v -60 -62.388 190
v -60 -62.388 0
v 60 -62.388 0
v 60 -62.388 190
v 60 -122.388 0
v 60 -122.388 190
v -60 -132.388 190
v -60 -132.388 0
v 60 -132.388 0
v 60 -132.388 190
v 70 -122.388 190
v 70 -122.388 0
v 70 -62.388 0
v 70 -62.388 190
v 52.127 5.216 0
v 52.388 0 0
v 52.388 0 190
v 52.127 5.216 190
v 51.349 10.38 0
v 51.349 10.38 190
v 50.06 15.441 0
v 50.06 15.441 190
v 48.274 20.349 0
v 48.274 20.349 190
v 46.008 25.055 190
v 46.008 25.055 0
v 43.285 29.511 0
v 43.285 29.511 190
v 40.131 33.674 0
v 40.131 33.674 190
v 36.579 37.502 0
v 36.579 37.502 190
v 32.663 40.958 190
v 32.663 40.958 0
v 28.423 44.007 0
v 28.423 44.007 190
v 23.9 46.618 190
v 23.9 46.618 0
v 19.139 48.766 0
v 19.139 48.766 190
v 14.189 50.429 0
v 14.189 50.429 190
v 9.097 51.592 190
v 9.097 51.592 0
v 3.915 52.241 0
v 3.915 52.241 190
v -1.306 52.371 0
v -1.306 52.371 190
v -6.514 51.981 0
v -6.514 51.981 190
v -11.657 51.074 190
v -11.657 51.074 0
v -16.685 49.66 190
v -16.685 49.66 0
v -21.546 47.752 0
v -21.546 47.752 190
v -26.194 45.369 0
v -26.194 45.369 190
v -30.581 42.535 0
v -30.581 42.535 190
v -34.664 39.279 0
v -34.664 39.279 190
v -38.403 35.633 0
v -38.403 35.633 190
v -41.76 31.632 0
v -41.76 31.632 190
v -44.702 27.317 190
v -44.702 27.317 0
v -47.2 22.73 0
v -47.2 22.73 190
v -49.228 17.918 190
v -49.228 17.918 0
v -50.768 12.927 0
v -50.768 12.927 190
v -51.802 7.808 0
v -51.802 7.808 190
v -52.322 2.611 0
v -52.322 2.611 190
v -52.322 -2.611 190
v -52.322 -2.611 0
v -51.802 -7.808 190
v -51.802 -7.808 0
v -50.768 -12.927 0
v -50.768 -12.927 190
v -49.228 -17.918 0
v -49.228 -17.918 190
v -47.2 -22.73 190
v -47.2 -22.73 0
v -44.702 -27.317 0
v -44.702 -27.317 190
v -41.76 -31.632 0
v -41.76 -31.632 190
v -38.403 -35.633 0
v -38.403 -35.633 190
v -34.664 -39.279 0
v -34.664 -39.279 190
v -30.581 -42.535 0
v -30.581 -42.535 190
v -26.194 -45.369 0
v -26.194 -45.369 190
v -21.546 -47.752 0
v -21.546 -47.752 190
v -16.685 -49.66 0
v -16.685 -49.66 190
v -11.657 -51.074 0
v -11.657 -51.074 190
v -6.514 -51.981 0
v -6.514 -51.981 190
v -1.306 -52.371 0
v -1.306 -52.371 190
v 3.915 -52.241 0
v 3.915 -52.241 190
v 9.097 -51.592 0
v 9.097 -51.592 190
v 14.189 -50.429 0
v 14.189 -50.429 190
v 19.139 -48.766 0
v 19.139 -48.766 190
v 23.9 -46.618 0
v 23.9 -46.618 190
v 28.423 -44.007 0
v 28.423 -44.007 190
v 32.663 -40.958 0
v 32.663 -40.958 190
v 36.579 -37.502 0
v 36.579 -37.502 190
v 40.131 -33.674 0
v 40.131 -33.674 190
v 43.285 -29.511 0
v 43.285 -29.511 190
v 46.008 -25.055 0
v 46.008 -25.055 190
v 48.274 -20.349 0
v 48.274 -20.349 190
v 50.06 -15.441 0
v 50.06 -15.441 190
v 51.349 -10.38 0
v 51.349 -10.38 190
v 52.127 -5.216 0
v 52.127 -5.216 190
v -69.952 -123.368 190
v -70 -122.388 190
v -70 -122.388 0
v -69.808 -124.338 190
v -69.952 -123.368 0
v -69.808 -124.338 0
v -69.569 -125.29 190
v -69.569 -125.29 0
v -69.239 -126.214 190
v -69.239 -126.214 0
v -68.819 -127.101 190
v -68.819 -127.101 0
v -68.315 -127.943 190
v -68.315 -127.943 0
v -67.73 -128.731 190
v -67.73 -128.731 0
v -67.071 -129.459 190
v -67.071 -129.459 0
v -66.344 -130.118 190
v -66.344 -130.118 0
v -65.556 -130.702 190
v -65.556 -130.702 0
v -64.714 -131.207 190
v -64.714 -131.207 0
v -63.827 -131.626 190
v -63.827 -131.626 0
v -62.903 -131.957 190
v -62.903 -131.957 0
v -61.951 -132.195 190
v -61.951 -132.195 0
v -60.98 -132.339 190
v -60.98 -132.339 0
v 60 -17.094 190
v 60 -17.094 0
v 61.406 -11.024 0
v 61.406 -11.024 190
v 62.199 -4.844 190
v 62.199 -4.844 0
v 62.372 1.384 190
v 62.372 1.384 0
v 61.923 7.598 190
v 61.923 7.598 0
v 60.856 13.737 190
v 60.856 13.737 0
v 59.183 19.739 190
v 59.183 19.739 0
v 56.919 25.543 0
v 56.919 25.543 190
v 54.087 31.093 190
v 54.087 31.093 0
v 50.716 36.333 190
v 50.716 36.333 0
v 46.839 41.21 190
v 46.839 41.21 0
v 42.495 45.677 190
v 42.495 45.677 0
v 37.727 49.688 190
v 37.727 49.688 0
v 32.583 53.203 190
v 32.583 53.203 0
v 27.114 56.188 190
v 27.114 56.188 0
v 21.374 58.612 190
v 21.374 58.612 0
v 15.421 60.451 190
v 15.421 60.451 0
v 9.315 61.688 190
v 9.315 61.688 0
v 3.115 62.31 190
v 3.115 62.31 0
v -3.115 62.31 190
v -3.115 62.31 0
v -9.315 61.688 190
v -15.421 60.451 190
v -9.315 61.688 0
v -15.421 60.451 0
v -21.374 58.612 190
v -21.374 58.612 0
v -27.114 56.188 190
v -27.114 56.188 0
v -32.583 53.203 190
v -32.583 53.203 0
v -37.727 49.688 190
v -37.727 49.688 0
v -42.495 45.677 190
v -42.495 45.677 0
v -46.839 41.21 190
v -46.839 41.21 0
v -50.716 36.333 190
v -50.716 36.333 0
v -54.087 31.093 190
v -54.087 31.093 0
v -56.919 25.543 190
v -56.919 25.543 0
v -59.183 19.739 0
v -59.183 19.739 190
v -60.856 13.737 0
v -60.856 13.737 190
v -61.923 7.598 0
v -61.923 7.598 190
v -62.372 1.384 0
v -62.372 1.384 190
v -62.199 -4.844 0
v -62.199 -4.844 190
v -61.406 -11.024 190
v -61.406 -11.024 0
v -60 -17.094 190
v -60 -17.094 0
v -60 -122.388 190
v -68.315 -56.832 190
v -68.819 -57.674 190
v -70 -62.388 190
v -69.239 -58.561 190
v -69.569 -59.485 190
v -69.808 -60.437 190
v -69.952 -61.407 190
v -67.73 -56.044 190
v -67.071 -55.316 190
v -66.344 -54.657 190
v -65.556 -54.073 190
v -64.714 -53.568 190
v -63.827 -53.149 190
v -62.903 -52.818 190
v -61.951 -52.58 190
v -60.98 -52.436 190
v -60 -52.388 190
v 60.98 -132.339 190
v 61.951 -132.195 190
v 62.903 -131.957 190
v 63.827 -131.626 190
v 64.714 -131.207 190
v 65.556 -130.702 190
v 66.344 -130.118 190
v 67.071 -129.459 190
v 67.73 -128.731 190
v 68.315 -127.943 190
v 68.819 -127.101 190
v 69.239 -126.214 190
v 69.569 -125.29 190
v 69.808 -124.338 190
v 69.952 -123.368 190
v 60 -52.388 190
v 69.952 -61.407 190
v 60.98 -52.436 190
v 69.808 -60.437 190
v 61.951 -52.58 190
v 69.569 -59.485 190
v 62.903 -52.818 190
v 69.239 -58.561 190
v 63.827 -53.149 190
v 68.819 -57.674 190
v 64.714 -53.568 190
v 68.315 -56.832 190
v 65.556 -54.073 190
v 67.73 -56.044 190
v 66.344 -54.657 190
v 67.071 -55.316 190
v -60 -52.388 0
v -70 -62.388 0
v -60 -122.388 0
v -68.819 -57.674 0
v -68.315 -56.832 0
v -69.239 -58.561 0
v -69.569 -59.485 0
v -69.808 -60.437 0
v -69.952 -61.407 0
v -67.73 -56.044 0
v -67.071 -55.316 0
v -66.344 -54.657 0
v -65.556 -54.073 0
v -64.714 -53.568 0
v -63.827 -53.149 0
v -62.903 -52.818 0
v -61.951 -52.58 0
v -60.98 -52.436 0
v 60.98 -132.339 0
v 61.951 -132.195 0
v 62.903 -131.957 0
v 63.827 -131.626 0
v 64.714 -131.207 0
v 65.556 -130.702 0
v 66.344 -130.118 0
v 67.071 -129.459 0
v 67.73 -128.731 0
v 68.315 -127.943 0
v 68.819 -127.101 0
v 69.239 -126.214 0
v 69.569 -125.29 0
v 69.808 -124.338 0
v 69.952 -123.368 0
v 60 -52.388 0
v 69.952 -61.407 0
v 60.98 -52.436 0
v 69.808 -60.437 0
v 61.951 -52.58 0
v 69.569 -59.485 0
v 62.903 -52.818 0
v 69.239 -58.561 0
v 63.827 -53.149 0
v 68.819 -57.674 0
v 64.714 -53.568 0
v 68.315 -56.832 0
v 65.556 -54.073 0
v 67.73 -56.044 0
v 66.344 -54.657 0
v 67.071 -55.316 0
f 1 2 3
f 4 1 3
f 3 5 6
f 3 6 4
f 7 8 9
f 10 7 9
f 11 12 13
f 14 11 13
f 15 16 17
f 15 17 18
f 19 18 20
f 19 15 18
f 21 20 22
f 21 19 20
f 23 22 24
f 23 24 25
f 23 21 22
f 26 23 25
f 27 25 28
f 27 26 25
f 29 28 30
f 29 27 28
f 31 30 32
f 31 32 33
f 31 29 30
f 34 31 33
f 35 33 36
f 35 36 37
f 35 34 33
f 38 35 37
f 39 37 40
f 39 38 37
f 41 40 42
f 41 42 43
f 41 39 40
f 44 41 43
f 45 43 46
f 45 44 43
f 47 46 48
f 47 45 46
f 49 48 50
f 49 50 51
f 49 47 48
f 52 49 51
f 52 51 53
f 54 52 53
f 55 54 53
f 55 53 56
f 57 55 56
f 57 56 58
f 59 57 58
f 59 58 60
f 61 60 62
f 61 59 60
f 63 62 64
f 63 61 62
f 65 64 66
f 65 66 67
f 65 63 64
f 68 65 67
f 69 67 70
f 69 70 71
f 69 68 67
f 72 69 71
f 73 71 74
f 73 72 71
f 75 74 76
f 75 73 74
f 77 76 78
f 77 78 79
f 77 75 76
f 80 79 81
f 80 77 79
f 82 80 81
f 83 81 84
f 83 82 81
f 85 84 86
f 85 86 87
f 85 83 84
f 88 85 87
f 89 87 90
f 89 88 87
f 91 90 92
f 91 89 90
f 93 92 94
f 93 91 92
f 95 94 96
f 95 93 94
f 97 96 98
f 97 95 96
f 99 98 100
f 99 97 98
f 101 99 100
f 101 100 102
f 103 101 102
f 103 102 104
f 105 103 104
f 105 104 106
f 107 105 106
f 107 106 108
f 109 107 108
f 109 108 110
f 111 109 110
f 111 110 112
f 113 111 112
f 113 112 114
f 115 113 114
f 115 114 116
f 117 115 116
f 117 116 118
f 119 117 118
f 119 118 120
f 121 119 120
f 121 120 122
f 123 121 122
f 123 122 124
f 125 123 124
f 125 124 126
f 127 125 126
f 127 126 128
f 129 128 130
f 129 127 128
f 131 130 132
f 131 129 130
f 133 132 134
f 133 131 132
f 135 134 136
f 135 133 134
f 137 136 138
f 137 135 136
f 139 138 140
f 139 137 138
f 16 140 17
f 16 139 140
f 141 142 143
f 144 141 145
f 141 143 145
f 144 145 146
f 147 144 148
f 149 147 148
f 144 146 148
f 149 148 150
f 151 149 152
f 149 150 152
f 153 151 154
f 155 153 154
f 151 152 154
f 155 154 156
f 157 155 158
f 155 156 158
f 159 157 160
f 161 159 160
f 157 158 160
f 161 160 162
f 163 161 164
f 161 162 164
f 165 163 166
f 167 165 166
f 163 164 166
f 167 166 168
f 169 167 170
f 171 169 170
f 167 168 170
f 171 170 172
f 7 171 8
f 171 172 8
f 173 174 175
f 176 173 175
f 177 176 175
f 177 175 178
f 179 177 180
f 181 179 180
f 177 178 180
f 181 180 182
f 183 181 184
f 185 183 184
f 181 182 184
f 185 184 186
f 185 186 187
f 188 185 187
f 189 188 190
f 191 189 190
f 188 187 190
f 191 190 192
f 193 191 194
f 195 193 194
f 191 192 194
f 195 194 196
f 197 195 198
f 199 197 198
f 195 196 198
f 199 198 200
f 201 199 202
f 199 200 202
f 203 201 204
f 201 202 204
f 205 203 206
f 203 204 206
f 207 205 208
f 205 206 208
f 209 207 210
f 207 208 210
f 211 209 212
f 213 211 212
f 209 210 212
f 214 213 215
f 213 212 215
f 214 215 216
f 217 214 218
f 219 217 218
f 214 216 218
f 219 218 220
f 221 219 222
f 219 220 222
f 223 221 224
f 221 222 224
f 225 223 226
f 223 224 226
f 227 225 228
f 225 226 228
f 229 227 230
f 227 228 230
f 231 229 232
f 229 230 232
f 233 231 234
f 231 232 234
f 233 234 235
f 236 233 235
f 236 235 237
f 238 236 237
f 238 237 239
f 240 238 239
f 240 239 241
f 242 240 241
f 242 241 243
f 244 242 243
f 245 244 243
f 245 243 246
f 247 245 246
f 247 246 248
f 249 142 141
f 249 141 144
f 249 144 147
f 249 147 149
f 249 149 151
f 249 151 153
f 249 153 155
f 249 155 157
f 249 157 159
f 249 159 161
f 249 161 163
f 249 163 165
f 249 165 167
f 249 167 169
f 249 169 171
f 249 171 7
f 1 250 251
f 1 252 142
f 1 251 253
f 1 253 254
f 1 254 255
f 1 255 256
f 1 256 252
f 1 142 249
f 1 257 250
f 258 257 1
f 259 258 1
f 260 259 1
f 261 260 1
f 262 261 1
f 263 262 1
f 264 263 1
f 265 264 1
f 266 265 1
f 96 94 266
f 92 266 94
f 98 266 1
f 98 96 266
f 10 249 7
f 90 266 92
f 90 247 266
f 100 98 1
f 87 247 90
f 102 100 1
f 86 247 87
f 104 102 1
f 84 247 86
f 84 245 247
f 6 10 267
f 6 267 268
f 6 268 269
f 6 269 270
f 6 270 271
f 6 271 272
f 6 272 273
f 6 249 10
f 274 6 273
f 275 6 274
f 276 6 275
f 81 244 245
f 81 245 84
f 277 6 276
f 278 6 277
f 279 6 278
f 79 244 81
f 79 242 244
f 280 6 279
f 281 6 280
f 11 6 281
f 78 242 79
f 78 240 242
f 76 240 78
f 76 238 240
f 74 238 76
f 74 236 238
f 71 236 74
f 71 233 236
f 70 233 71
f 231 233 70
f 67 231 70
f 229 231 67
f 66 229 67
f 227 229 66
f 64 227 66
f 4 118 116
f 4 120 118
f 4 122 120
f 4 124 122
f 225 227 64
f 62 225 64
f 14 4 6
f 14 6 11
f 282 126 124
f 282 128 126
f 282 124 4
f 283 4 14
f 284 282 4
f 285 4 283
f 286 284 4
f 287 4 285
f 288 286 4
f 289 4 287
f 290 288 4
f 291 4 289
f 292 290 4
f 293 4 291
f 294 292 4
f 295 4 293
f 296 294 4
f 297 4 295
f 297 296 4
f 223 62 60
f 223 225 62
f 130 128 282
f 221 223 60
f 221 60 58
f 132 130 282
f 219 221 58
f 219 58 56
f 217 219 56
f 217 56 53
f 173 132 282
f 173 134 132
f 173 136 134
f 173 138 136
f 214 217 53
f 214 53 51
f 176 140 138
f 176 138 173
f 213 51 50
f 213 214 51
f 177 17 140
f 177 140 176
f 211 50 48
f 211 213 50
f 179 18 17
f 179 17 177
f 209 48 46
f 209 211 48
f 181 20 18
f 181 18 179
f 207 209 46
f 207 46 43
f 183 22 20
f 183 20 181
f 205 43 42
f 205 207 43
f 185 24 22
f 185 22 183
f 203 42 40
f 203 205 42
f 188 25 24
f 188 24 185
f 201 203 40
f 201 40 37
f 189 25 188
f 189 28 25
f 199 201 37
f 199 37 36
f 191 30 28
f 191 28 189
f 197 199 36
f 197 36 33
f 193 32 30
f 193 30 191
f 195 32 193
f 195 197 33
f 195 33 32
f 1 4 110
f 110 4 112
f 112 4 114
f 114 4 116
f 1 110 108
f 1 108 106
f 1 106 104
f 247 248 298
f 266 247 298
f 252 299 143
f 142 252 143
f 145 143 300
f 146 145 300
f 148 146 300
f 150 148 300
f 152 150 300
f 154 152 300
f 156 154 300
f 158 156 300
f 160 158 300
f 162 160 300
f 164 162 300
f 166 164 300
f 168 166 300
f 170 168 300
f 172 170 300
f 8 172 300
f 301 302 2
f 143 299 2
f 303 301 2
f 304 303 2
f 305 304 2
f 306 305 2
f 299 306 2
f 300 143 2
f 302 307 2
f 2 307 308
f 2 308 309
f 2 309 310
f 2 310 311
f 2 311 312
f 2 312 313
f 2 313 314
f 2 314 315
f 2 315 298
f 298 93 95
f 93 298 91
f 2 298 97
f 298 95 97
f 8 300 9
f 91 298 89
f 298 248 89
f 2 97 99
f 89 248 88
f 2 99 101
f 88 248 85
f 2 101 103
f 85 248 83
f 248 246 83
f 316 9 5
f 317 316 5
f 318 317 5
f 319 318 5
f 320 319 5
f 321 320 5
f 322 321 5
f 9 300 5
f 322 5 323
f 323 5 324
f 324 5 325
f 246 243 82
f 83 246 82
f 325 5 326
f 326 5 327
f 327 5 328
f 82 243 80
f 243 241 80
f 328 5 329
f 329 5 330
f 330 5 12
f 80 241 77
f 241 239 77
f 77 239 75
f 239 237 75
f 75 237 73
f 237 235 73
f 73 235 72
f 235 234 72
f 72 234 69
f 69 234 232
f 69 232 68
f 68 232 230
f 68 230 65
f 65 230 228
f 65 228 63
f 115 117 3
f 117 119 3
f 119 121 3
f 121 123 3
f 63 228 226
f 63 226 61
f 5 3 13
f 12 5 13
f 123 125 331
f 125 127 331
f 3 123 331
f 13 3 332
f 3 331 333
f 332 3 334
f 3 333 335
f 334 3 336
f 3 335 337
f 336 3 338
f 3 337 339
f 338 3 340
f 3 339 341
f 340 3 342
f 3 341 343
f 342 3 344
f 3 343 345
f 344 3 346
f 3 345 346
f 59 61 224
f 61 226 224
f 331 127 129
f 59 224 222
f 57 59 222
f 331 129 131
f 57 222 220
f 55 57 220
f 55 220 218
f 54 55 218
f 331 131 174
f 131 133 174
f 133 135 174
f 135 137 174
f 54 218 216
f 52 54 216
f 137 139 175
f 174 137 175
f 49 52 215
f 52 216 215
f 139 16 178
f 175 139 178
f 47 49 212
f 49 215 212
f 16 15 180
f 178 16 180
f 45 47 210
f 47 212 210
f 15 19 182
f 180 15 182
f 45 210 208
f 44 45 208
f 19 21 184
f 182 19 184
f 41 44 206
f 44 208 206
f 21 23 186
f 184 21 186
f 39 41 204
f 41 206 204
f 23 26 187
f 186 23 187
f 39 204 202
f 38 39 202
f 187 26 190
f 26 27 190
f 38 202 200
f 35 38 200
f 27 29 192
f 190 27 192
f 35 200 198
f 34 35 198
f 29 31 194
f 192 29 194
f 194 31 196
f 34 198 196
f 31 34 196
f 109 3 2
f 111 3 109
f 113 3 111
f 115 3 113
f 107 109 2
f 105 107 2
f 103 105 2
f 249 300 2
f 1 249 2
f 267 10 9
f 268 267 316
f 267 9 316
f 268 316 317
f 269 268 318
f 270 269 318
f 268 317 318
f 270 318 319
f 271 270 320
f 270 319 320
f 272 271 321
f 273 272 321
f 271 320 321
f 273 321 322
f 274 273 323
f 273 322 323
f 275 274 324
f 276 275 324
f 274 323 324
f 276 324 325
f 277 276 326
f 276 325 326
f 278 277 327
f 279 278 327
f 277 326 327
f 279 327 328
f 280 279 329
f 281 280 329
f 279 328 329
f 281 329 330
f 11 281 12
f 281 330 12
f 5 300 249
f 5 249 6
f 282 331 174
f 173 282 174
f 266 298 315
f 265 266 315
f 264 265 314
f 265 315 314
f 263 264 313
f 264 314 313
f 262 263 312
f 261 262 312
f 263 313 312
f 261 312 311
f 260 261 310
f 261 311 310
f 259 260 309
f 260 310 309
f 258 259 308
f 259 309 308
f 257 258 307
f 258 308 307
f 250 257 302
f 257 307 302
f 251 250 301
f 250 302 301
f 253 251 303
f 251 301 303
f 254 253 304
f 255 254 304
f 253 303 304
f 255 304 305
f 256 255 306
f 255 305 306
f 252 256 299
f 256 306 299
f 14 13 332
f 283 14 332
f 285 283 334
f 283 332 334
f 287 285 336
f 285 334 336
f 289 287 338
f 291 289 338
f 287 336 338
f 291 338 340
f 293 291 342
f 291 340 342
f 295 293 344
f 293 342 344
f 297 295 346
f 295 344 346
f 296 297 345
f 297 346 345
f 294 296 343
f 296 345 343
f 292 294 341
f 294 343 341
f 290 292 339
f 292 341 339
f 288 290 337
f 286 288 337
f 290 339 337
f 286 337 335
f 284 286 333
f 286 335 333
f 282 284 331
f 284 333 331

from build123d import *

# Parameters (mm, degrees)
SKETCH1_R           = 52.3875
SKETCH1_W           = 120
SKETCH1_H           = 60
BOSS_EXTRUDE1_DEPTH = 190


with BuildPart() as part:
    # Sketch1 → Boss-Extrude1 (new body)
    with BuildSketch(Plane.XY):
        with BuildLine():
            Line((-70, -62.3875), (-70, -122.3875))
            ThreePointArc((-70, -122.3875), (-67.071067812, -129.458567812), (-60, -132.3875))
            Line((-60, -132.3875), (60, -132.3875))
            ThreePointArc((60, -132.3875), (67.071067812, -129.458567812), (70, -122.3875))
            Line((70, -122.3875), (70, -62.3875))
            ThreePointArc((70, -62.3875), (67.071067812, -55.316432188), (60, -52.3875))
            Line((60, -52.3875), (60, -17.093863117))
            ThreePointArc((60, -17.093863117), (0, 62.3875), (-60, -17.093863117))
            Line((-60, -17.093863117), (-60, -52.3875))
            ThreePointArc((-60, -52.3875), (-67.071067812, -55.316432188), (-70, -62.3875))
        make_face()
        Circle(SKETCH1_R, mode=Mode.SUBTRACT)
        with Locations((0, -92.3875)):
            Rectangle(SKETCH1_W, SKETCH1_H, mode=Mode.SUBTRACT)
    extrude(amount=BOSS_EXTRUDE1_DEPTH)


solid = part.part
